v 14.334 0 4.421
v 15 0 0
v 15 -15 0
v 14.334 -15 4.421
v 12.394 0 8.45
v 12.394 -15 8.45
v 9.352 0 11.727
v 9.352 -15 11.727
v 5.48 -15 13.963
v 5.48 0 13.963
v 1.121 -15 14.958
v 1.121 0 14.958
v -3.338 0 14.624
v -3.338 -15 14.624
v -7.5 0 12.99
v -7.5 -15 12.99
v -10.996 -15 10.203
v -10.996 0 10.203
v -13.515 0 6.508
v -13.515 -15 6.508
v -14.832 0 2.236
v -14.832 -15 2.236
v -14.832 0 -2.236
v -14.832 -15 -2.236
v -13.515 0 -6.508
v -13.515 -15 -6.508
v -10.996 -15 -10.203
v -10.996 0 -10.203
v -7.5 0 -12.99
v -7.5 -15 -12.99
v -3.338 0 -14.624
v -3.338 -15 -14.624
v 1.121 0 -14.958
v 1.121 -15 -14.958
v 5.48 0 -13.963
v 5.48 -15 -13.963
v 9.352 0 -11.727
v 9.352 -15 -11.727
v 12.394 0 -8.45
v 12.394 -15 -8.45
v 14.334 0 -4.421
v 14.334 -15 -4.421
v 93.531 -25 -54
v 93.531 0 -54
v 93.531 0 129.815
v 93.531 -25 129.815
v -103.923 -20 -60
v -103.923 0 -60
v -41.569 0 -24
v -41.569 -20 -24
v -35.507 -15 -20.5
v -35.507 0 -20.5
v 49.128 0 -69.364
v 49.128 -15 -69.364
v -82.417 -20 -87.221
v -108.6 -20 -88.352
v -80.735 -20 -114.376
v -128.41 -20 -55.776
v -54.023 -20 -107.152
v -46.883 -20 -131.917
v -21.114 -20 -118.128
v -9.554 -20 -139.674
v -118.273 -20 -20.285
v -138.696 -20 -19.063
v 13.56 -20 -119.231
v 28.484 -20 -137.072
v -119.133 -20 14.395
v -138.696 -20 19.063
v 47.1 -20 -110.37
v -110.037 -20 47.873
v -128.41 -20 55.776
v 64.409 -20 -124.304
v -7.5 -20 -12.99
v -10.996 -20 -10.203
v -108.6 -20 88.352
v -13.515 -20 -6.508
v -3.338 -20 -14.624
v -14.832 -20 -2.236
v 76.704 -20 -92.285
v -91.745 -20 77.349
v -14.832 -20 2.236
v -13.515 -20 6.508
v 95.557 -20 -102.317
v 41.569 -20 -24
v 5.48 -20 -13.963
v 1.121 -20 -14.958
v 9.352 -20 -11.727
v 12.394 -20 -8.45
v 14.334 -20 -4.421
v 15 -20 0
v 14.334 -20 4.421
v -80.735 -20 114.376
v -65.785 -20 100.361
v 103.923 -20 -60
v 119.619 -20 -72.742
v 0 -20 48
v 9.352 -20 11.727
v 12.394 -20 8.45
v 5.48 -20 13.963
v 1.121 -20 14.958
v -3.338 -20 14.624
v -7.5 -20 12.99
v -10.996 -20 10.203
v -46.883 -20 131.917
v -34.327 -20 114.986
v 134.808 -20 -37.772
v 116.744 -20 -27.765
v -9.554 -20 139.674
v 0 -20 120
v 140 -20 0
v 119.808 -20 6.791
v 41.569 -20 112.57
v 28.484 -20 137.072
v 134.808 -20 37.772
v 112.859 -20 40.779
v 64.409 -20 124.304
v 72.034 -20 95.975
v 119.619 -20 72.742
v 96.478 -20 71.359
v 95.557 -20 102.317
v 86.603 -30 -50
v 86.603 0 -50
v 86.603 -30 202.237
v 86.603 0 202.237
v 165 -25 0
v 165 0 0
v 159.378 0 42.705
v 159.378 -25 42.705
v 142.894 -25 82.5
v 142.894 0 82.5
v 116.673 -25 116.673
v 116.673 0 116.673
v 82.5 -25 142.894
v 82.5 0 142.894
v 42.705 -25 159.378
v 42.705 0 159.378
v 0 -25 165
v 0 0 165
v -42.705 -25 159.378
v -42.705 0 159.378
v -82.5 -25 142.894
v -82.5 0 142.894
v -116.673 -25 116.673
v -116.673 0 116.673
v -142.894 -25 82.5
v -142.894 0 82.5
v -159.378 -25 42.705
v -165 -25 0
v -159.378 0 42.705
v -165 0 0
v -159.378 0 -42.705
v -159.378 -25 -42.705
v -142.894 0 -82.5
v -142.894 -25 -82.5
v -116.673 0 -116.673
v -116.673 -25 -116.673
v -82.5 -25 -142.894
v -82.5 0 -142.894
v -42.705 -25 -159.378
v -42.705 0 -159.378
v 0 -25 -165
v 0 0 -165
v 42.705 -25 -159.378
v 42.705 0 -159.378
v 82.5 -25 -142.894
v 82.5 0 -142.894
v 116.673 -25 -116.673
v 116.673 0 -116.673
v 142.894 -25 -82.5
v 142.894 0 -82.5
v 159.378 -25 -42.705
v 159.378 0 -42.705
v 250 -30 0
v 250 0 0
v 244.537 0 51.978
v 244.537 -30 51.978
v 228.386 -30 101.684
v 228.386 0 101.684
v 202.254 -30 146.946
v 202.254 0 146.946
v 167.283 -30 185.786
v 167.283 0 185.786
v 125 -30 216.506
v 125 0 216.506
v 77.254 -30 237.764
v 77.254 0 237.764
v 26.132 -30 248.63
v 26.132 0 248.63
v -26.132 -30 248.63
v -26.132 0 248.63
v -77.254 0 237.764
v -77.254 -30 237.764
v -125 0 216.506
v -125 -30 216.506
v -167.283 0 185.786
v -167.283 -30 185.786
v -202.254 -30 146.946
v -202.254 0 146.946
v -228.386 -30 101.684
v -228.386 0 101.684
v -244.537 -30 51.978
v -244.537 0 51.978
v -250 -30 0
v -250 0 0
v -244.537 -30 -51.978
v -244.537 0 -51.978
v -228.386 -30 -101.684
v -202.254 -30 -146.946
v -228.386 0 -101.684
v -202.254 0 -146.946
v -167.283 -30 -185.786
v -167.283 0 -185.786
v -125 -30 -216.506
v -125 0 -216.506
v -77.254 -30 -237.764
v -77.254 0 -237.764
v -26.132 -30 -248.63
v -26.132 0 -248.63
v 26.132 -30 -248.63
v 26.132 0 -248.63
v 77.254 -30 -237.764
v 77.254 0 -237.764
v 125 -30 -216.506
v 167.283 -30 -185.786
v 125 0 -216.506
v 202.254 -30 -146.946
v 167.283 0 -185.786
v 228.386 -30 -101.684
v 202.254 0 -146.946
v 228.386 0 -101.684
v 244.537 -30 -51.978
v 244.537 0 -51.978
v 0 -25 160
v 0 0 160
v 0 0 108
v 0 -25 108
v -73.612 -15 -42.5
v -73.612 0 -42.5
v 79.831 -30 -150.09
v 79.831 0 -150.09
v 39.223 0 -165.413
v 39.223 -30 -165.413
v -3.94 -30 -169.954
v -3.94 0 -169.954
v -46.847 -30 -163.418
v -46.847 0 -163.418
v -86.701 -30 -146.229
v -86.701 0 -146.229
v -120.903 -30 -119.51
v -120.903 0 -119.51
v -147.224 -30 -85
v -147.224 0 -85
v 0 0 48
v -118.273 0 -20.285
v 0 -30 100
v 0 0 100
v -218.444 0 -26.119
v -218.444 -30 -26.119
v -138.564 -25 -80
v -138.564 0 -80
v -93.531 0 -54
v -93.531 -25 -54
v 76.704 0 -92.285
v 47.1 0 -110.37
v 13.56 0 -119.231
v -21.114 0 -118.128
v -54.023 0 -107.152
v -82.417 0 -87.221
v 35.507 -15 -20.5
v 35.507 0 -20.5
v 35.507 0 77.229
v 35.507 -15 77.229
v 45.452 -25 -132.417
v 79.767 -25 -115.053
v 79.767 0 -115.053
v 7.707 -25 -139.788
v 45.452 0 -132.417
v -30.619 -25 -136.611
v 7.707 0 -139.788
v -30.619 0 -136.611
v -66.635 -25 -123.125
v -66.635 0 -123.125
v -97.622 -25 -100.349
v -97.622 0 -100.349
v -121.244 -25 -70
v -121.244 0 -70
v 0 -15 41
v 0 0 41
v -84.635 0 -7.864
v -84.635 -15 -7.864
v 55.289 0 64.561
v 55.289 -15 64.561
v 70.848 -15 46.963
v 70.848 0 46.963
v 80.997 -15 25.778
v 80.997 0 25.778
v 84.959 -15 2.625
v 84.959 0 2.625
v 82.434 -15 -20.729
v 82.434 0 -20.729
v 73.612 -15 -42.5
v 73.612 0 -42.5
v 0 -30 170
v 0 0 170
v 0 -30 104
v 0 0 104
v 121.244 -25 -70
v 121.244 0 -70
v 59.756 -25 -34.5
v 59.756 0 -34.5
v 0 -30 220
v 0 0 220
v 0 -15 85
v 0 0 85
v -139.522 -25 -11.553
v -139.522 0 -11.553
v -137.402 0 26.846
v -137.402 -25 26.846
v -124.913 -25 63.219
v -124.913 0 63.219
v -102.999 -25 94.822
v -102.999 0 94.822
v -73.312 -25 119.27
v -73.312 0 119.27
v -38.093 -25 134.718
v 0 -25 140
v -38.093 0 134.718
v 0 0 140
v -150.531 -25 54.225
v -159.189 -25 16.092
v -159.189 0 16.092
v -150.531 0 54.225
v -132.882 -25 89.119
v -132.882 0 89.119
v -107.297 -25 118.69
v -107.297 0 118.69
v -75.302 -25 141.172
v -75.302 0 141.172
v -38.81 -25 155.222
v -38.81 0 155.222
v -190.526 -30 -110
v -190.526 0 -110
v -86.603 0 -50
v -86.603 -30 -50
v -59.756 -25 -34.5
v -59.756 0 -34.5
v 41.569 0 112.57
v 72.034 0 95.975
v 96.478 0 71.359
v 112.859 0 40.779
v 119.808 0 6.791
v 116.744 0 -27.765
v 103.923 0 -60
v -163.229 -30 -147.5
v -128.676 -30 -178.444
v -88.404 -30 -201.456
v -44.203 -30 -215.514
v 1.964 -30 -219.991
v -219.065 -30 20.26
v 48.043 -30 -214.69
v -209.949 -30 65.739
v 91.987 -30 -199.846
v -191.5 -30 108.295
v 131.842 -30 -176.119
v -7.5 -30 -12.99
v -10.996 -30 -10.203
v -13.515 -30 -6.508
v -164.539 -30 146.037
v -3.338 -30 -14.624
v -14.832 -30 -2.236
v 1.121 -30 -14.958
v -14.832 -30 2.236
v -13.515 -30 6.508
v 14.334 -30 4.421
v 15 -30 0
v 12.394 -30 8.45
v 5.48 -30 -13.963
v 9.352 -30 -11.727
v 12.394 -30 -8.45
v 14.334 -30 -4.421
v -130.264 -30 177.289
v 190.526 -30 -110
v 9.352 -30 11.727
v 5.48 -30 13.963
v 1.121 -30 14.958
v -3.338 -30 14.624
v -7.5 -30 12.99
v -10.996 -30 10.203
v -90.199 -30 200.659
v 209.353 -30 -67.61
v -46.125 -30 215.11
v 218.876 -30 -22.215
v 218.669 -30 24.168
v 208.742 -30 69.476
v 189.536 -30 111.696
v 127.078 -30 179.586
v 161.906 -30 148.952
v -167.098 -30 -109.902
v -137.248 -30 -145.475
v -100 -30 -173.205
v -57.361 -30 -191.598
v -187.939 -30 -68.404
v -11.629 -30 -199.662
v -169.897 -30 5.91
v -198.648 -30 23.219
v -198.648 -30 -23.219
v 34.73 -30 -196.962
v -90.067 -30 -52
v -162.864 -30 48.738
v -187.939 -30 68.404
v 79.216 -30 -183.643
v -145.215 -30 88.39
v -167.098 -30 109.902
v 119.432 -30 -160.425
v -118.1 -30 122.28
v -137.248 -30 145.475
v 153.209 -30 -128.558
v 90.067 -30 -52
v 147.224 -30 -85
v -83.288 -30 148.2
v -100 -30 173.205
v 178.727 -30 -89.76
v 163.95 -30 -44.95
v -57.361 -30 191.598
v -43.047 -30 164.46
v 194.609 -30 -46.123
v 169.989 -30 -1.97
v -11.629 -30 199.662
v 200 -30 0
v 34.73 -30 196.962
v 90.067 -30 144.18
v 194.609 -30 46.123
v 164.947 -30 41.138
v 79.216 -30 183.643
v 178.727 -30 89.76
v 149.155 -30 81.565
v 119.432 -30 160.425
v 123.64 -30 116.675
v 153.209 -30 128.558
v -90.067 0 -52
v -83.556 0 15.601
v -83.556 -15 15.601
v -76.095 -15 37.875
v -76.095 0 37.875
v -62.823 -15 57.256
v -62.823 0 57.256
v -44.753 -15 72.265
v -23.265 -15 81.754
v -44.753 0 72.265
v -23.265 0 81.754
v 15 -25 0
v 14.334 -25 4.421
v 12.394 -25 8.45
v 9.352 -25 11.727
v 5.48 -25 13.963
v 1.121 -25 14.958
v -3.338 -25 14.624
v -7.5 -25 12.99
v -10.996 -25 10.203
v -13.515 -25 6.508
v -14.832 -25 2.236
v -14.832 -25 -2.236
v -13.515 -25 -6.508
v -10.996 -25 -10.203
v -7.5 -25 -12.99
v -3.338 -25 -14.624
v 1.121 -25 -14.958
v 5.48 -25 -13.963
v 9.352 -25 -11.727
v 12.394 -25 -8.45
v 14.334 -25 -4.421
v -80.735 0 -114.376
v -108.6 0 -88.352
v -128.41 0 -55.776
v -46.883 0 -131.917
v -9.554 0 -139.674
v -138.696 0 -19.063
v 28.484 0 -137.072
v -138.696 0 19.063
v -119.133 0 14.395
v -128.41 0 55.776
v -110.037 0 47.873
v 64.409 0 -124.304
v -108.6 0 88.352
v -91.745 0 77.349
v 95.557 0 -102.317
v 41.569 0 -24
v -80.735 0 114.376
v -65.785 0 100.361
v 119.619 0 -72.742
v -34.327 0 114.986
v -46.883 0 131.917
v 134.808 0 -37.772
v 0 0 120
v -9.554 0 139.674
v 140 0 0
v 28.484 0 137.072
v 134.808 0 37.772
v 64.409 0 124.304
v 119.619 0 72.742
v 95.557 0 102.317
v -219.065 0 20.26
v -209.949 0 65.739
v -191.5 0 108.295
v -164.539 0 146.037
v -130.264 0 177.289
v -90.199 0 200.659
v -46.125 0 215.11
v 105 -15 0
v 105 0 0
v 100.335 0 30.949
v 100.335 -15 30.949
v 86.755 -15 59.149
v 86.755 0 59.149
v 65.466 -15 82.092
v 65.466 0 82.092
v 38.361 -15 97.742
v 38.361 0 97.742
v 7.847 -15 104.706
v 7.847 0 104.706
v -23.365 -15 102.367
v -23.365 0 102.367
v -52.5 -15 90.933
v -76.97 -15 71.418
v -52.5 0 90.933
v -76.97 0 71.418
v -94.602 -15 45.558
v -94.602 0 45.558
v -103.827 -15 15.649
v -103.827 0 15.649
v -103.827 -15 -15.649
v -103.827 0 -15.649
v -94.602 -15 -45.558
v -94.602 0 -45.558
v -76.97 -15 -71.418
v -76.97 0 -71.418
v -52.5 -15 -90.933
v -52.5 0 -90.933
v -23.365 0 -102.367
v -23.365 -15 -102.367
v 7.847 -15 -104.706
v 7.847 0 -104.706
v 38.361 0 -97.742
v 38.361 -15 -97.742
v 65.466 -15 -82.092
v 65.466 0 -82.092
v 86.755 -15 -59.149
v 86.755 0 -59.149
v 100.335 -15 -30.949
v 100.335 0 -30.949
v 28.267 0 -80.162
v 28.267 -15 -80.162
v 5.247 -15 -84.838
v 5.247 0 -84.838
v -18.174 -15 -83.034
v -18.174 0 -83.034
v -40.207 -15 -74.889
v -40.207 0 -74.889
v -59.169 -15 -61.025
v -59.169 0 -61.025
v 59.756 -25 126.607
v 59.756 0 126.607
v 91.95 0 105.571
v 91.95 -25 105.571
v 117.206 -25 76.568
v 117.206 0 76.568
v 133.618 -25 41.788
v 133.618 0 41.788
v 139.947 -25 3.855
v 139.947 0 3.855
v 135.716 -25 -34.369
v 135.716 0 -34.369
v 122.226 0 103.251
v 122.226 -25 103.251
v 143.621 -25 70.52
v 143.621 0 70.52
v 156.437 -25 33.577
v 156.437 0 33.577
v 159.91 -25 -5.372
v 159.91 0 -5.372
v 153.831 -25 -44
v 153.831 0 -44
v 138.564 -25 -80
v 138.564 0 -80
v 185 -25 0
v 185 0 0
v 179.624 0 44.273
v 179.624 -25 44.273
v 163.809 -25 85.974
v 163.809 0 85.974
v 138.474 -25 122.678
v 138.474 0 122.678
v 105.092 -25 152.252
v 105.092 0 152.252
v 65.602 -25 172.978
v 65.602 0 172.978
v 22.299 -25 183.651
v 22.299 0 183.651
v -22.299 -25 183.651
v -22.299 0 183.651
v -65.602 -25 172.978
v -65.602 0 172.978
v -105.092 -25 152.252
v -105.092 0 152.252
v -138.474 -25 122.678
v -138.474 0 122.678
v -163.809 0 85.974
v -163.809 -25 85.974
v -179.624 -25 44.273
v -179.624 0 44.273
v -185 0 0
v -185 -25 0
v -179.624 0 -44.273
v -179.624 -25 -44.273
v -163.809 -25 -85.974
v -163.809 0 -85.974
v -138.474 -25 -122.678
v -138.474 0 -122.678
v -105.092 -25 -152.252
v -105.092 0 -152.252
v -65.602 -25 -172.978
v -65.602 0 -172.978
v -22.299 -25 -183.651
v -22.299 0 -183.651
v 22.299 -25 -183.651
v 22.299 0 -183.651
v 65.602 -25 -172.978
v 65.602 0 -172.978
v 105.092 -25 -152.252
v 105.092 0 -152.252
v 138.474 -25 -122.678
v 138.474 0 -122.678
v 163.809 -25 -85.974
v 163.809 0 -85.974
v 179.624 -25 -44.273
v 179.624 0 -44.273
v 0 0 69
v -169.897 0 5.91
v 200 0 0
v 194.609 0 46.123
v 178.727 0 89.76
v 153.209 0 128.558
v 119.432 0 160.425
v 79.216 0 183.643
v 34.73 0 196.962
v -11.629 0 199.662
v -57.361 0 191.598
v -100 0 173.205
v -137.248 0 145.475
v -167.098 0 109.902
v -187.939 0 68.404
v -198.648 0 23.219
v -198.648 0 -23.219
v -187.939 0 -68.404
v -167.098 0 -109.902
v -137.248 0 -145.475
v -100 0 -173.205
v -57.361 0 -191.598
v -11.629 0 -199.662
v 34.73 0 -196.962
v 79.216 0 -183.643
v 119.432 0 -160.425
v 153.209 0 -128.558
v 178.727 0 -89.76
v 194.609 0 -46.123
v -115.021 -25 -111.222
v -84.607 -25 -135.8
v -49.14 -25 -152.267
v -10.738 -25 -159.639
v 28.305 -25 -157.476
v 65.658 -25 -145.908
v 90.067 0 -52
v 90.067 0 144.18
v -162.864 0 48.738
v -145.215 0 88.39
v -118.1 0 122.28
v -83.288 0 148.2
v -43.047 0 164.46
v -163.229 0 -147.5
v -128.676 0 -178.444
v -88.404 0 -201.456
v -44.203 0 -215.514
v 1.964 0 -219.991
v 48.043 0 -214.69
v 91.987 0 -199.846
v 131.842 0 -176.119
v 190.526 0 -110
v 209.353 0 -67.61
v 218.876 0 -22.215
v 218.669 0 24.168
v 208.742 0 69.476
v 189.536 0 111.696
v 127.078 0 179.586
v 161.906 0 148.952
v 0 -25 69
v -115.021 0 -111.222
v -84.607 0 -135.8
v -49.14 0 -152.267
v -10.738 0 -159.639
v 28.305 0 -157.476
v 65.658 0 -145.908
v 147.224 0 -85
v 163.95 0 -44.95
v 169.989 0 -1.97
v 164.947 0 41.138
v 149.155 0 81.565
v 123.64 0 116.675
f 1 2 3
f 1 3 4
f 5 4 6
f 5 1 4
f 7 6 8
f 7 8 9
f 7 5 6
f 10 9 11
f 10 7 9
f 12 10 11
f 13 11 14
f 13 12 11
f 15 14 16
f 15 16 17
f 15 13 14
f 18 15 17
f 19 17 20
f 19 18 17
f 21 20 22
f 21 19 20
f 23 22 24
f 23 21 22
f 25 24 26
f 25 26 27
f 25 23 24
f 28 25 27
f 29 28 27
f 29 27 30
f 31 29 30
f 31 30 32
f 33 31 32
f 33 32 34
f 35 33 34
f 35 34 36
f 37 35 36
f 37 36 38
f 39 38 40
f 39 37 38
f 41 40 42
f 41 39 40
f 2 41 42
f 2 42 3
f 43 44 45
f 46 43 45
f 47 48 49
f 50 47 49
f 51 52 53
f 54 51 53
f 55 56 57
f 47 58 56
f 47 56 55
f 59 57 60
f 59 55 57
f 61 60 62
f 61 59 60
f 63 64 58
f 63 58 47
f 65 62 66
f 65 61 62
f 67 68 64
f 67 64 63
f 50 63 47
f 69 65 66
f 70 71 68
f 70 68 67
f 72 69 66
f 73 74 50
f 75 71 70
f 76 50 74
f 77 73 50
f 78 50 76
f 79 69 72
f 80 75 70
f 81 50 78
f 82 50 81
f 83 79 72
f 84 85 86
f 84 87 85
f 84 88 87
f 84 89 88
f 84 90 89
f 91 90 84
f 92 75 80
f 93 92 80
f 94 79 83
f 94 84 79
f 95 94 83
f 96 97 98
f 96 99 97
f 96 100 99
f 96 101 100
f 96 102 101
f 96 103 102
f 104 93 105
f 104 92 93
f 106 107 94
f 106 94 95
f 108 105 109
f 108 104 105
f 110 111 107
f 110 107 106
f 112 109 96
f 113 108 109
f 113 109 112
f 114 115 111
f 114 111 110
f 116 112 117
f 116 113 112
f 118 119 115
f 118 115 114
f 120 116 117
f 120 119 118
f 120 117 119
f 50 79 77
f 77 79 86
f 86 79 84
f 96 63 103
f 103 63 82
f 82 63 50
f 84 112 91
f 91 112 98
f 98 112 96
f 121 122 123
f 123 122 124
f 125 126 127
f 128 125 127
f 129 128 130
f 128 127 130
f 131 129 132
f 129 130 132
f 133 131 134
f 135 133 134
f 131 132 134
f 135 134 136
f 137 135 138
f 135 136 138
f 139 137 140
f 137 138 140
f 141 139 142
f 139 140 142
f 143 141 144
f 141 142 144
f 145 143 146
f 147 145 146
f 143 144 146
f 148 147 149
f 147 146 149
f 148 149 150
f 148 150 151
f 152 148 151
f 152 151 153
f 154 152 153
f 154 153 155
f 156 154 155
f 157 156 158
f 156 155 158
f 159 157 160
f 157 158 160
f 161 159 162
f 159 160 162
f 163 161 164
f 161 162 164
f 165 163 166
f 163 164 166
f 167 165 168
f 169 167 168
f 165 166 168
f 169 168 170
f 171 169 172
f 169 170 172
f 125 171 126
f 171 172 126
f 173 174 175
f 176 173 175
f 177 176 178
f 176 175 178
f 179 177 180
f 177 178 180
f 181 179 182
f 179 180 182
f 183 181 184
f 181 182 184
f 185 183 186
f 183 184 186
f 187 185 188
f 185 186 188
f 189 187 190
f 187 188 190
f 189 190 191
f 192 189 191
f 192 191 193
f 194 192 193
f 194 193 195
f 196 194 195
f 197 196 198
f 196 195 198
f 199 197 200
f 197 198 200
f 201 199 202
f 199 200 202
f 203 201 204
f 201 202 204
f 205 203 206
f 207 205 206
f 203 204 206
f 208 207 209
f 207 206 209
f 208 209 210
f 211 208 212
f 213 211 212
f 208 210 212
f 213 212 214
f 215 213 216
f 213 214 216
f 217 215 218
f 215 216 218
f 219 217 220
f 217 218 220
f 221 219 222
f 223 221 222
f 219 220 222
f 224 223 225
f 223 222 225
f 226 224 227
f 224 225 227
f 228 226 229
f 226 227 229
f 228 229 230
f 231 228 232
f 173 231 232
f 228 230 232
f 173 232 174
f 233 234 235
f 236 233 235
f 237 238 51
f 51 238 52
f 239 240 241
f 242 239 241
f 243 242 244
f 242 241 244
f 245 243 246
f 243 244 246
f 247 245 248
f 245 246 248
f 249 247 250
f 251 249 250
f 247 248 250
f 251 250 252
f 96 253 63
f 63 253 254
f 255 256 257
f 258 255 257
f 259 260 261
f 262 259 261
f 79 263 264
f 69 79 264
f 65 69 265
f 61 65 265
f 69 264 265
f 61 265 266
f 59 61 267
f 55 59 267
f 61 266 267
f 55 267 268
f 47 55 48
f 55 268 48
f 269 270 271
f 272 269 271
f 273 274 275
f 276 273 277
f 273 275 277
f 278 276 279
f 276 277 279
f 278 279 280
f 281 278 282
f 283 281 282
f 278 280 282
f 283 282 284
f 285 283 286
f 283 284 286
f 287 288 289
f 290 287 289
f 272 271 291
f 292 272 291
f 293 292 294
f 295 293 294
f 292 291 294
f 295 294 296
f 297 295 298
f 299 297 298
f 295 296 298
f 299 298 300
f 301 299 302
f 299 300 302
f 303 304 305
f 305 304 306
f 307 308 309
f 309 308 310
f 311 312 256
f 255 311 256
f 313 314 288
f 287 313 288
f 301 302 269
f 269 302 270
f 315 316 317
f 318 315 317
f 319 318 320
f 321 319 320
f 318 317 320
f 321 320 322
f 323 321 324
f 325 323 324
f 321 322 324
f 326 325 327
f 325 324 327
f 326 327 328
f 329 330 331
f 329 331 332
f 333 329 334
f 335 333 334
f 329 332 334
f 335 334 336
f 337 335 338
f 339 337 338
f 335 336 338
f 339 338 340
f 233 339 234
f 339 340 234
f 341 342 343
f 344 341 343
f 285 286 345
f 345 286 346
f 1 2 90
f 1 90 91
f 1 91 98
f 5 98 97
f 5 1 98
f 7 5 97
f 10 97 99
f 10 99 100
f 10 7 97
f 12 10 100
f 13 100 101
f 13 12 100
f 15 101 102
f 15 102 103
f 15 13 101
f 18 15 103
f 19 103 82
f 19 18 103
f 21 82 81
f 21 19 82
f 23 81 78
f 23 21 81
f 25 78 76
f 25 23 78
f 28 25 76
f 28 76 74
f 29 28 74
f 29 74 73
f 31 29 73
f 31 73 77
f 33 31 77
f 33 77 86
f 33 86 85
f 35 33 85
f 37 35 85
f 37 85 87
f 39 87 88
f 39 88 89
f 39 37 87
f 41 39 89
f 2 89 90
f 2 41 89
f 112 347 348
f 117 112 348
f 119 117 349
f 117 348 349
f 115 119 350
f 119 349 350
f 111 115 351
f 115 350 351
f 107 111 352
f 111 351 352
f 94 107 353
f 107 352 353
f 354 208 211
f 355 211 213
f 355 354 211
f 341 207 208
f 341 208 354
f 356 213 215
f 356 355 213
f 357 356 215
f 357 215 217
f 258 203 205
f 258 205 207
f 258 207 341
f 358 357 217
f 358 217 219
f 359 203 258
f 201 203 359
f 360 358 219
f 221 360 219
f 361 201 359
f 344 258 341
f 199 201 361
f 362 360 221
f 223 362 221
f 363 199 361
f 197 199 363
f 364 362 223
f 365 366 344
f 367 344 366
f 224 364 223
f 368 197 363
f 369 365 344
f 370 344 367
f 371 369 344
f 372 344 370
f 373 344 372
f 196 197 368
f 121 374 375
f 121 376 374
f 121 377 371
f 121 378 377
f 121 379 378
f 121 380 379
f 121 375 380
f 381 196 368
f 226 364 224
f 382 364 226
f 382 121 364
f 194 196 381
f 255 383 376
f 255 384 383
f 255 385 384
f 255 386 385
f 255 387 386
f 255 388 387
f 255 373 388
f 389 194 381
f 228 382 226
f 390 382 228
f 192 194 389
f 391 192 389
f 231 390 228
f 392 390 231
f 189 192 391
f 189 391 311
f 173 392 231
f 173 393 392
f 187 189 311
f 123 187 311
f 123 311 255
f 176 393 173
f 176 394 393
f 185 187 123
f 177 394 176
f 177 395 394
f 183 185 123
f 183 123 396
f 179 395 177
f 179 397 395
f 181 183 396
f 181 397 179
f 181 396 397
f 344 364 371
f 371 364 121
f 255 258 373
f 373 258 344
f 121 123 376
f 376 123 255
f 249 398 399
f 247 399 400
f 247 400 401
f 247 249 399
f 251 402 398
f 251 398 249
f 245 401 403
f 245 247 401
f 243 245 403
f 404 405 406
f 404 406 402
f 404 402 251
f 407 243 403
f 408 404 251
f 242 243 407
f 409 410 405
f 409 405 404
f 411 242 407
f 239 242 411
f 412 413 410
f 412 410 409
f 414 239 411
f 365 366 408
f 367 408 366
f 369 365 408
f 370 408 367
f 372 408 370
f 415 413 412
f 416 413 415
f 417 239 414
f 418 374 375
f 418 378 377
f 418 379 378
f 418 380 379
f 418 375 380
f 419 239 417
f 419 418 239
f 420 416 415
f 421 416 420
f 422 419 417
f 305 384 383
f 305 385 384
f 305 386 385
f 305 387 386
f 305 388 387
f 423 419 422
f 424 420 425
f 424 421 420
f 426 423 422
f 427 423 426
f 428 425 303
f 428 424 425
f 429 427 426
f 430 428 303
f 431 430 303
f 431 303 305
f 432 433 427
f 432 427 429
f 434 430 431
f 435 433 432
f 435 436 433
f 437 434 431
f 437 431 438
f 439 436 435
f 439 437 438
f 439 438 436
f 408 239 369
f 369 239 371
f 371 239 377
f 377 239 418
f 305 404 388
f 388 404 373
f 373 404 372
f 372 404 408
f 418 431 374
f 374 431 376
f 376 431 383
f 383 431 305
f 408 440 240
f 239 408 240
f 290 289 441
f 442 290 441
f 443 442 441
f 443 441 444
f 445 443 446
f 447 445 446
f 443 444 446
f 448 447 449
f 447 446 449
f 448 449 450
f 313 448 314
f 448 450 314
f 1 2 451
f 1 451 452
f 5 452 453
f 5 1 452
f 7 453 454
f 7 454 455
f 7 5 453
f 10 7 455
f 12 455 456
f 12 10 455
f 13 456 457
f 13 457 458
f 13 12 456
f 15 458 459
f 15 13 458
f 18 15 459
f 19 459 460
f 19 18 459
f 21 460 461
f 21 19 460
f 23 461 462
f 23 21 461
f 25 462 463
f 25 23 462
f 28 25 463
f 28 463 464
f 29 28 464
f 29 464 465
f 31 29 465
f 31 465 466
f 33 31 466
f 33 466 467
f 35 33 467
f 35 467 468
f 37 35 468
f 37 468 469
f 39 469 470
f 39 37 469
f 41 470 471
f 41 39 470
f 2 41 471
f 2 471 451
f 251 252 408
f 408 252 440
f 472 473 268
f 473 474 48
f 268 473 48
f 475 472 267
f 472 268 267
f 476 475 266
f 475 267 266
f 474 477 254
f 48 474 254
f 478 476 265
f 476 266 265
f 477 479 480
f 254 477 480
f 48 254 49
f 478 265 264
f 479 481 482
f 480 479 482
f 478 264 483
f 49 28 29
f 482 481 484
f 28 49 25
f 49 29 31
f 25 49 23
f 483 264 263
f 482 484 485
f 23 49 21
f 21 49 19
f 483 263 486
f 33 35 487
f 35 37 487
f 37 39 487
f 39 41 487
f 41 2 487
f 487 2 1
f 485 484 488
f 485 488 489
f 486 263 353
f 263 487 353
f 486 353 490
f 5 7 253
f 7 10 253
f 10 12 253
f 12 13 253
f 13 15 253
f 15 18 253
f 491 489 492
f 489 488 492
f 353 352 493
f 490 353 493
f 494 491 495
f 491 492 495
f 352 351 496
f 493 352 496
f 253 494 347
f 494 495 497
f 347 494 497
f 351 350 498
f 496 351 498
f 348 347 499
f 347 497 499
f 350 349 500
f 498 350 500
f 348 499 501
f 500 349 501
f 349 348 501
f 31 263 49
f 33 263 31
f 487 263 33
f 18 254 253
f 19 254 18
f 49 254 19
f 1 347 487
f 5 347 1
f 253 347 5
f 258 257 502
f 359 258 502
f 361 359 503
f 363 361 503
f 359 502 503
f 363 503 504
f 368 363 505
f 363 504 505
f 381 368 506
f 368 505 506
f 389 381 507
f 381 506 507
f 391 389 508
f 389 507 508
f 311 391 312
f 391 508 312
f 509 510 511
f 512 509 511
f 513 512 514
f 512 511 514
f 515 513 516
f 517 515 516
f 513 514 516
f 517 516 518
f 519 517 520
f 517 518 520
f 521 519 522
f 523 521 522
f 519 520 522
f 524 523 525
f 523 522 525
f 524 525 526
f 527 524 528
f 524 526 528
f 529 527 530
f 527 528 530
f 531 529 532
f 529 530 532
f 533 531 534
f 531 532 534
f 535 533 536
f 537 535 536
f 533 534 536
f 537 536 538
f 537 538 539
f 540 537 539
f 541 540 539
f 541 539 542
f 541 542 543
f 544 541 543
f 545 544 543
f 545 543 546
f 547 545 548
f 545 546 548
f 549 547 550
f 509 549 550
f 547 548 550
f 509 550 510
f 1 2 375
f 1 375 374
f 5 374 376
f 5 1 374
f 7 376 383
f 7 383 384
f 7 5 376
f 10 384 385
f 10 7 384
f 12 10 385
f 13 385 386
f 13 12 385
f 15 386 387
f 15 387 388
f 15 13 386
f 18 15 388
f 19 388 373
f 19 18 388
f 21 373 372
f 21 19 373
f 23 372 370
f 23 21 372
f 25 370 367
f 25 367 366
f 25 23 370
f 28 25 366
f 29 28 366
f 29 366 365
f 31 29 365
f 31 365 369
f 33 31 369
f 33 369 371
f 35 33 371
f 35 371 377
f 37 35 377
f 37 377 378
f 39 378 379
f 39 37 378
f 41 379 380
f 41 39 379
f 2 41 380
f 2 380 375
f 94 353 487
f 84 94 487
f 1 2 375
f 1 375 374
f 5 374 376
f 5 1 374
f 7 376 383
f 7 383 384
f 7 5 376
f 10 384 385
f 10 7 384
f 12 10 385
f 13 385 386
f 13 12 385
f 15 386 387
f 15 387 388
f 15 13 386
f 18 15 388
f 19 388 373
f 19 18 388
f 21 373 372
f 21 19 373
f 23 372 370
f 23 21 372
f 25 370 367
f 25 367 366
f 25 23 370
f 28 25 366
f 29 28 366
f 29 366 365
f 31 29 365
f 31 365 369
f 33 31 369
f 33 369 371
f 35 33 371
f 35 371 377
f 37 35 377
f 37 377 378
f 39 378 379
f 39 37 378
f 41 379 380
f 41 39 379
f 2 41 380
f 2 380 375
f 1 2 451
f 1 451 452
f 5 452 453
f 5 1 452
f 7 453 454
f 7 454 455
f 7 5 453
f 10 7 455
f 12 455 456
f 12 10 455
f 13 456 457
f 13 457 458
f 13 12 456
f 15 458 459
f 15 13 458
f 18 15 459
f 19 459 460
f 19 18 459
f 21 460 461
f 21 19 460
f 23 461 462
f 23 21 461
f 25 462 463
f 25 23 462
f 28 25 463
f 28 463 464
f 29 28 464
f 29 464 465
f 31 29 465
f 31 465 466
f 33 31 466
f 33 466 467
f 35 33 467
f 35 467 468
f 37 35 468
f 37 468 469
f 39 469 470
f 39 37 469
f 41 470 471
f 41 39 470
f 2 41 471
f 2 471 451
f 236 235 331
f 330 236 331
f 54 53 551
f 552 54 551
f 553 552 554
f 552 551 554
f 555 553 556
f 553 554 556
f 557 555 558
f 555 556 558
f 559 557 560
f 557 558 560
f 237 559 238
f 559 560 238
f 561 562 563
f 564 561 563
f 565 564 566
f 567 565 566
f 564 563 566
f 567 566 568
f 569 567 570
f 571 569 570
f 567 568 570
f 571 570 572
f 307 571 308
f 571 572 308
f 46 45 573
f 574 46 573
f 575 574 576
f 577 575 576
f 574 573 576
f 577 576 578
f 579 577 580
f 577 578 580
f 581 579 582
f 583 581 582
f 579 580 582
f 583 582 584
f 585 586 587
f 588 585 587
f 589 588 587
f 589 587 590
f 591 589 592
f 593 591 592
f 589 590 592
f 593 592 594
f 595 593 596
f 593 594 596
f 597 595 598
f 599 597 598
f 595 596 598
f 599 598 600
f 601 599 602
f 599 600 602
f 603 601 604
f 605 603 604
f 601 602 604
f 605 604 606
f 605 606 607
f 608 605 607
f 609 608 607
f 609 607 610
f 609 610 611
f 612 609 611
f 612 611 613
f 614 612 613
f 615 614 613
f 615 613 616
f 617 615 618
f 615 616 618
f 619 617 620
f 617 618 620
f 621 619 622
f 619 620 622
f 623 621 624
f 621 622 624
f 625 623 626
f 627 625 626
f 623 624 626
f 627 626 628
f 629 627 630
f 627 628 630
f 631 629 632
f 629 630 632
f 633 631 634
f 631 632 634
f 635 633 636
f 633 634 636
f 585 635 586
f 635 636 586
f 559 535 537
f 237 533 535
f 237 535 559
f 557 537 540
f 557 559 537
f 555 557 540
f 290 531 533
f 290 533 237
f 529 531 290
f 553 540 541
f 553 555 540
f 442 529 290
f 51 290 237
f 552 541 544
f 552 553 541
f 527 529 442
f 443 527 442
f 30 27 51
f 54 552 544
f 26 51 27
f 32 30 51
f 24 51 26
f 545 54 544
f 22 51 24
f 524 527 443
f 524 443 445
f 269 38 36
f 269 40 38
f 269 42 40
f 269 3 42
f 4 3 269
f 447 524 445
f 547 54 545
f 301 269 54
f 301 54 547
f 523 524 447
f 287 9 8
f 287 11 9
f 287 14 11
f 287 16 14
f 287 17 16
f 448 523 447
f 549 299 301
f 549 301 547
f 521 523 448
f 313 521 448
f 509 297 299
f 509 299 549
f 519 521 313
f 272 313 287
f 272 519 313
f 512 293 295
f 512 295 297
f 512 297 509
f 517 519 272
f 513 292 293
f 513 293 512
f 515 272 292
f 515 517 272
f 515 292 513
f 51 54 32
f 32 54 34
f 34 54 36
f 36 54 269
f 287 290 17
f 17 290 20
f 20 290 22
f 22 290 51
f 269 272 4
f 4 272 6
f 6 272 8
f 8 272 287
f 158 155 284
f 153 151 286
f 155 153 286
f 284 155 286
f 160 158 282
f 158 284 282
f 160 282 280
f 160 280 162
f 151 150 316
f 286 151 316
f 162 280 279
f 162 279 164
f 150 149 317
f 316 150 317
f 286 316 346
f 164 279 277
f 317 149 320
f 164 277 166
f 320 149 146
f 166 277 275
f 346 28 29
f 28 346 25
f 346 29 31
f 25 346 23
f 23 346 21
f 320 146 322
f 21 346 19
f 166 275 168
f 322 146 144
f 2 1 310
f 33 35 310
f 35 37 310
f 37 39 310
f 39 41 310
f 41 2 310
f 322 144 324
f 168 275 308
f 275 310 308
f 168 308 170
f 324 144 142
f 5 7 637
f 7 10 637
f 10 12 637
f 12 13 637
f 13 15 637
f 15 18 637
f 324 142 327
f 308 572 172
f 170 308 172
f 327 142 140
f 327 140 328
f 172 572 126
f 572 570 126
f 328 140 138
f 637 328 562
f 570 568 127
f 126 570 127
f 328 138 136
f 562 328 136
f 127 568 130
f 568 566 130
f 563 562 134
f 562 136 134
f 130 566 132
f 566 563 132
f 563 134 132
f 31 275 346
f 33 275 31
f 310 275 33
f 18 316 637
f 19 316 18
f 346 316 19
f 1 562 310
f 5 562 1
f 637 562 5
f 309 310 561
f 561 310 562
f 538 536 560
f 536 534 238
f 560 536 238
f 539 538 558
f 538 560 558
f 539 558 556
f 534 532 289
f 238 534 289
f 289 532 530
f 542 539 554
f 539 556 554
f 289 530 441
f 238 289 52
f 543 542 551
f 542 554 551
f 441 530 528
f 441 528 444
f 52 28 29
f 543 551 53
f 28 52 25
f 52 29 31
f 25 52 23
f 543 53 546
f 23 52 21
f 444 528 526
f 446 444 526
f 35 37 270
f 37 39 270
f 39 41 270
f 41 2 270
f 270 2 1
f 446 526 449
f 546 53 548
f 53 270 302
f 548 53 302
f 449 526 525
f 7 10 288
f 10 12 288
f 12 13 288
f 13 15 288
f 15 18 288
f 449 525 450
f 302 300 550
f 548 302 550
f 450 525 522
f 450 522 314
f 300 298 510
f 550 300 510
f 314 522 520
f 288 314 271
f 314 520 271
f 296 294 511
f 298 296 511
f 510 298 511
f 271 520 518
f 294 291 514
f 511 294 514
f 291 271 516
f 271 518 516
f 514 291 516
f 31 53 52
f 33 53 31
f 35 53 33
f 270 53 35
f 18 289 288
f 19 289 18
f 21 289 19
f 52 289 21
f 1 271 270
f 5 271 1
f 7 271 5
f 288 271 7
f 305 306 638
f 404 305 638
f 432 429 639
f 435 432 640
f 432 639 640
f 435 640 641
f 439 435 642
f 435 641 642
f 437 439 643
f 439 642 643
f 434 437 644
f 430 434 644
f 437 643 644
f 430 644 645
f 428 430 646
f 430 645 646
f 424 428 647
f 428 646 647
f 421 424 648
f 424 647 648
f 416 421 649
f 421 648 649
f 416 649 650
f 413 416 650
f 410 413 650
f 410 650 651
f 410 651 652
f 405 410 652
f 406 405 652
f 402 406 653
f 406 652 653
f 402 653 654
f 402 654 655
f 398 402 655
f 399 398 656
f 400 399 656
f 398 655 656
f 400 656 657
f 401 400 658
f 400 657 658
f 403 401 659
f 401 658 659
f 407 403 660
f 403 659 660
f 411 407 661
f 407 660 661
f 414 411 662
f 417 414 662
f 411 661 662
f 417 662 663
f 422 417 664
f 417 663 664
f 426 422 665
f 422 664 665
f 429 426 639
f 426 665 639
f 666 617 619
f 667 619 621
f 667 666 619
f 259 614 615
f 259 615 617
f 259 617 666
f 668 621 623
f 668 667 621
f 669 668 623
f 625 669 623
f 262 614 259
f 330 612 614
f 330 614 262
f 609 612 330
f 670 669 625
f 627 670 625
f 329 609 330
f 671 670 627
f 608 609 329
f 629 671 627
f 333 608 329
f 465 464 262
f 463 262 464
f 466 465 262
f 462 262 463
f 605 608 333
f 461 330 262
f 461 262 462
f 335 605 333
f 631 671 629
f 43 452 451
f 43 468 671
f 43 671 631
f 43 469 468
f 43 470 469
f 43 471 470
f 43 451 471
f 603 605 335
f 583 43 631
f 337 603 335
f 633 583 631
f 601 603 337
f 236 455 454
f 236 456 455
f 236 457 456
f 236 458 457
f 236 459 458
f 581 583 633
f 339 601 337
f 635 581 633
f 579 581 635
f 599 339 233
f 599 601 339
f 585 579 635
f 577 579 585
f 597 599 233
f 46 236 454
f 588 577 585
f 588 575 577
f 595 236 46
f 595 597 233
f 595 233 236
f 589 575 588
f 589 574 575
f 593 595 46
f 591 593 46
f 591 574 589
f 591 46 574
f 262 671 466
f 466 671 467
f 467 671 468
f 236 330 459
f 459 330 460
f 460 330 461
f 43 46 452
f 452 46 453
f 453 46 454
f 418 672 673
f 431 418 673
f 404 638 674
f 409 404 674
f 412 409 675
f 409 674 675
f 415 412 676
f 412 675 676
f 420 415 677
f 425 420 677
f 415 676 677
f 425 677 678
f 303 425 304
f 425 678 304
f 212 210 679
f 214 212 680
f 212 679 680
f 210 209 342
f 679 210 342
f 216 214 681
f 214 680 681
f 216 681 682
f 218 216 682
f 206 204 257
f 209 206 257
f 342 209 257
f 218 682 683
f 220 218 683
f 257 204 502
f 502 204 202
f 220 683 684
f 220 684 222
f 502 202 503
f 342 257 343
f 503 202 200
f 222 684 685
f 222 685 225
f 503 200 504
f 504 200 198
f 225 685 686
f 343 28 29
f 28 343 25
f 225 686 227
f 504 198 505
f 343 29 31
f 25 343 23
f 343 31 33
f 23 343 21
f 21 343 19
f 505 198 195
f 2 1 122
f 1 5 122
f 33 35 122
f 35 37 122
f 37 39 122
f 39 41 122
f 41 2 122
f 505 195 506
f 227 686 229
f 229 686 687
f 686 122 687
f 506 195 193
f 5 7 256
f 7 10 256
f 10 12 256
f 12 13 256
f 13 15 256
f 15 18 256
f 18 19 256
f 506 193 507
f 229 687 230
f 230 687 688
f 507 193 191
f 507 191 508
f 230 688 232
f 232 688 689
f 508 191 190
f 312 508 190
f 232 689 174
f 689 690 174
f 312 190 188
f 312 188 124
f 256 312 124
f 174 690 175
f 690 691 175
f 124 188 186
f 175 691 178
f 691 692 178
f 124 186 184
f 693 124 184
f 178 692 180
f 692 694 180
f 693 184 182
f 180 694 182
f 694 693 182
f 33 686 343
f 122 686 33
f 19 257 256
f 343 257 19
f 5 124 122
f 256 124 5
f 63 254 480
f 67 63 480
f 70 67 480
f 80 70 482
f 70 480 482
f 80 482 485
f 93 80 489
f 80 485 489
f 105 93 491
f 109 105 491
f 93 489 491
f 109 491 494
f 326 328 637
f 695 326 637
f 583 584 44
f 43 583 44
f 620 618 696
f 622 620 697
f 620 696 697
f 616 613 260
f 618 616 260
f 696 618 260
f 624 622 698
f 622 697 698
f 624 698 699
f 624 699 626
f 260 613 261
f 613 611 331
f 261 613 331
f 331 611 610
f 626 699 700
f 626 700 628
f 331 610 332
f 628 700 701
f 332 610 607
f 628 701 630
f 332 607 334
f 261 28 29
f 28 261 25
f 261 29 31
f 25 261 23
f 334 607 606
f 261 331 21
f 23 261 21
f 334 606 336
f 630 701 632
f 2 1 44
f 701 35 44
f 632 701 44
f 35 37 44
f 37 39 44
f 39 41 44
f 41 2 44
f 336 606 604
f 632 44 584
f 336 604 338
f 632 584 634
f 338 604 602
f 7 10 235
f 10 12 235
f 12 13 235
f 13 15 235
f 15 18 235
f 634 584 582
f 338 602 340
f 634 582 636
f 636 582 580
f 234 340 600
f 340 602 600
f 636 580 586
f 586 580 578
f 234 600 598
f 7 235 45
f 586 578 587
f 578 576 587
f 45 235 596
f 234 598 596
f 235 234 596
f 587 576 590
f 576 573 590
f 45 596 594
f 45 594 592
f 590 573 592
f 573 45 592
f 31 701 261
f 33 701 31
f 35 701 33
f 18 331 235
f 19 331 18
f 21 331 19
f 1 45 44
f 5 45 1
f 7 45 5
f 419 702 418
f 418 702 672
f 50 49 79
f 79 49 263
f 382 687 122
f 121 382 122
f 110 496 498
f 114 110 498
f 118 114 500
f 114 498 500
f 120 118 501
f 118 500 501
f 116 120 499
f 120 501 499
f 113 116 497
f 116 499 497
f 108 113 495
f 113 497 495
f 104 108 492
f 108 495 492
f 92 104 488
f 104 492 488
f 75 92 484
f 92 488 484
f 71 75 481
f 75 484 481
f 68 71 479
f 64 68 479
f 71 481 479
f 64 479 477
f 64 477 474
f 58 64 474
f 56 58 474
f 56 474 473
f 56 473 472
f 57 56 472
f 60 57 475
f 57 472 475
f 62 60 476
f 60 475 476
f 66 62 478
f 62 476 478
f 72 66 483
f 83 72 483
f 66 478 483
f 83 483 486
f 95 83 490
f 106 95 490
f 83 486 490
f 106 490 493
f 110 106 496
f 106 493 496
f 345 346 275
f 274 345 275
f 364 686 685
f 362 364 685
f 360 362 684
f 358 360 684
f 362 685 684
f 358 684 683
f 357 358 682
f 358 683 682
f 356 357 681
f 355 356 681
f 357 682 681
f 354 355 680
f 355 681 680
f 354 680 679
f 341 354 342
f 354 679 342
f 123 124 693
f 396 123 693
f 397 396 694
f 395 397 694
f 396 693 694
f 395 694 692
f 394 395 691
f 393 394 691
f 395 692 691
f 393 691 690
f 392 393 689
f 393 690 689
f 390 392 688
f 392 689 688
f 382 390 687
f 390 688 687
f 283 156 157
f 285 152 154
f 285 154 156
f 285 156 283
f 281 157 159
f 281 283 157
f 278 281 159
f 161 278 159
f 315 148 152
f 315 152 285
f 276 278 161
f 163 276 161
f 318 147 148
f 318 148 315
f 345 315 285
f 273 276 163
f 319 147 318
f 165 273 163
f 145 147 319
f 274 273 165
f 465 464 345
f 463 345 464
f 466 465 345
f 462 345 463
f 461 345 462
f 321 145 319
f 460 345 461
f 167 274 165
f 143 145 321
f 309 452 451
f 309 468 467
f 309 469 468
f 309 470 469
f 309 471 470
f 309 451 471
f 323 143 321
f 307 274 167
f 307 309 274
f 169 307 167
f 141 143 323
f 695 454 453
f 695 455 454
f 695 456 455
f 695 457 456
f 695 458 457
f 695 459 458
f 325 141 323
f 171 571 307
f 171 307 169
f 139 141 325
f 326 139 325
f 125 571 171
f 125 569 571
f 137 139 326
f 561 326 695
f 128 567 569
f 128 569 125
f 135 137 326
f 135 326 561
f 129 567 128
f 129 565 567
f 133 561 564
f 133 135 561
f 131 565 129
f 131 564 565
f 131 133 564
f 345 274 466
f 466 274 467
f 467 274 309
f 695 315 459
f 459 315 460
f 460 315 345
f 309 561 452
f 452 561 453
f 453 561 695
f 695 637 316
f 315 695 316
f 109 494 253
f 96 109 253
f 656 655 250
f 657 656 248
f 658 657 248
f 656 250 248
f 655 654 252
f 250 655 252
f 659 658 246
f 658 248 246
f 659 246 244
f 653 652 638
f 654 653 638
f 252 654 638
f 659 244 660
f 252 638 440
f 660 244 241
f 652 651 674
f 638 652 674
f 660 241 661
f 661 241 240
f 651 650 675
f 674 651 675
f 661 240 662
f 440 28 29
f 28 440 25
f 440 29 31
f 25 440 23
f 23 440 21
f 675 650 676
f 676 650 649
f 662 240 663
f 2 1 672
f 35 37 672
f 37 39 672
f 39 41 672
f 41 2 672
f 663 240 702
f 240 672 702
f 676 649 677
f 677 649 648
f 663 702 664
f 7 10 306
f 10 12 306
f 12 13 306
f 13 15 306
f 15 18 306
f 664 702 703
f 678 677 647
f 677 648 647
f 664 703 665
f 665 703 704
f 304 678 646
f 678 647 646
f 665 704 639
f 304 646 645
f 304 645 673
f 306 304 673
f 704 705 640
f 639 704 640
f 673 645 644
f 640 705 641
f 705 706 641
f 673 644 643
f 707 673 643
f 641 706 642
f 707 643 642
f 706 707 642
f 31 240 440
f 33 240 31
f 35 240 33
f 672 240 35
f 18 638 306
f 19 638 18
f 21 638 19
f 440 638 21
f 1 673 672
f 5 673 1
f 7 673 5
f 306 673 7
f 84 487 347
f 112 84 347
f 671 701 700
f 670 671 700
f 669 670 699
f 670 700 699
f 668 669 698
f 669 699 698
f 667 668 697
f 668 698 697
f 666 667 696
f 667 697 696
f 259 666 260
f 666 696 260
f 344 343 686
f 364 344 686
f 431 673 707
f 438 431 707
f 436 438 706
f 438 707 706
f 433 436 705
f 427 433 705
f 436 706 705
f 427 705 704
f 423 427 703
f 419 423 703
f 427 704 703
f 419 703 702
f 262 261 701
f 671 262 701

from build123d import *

# Parameters (mm, degrees)
F0_R      = 250
F0_R_2    = 15
F1_DEPTH  = 30
F2_R      = 200
F2_R_2    = 15
F3_DEPTH  = 30
F4_R      = 185
F4_R_2    = 15
F5_DEPTH  = 25
F6_R      = 165
F6_R_2    = 15
F7_DEPTH  = 25
F8_R      = 140
F8_R_2    = 15
F9_DEPTH  = 20
F10_R     = 105
F10_R_2   = 15
F11_DEPTH = 15


with BuildPart() as f1:
    # F0 (on Front) → F1 (new body)
    with BuildSketch(Plane.XZ):
        Circle(F0_R)
        with BuildLine():
            Line((-190.525589, -110), (-86.60254, -50))
            Line((-86.60254, -50), (131.841529, -176.118742))
            ThreePointArc((131.841529, -176.118742), (-44.202678, -215.513627), (-190.525589, -110))
        make_face(mode=Mode.SUBTRACT)
        with BuildLine():
            ThreePointArc((-218.444069, -26.118742), (-164.538937, 146.037455), (0, 220))
            Line((0, 220), (0, 100))
            Line((0, 100), (-218.444069, -26.118742))
        make_face(mode=Mode.SUBTRACT)
        Circle(F0_R_2, mode=Mode.SUBTRACT)
        with BuildLine():
            Line((190.525589, -110), (86.60254, -50))
            Line((86.60254, -50), (86.60254, 202.237484))
            ThreePointArc((86.60254, 202.237484), (208.741615, 69.476171), (190.525589, -110))
        make_face(mode=Mode.SUBTRACT)
    extrude(amount=F1_DEPTH)


with BuildPart() as f3:
    # F2 (on Front) → F3 (new body)
    with BuildSketch(Plane.XZ):
        Circle(F2_R)
        with BuildLine():
            ThreePointArc((79.830605, -150.090221), (-46.847224, -163.417678), (-147.224319, -85))
            Line((-147.224319, -85), (-90.066642, -52))
            Line((-90.066642, -52), (79.830605, -150.090221))
        make_face(mode=Mode.SUBTRACT)
        with BuildLine():
            ThreePointArc((-169.897247, 5.909779), (-118.100249, 122.279725), (0, 170))
            Line((0, 170), (0, 104))
            Line((0, 104), (-169.897247, 5.909779))
        make_face(mode=Mode.SUBTRACT)
        Circle(F2_R_2, mode=Mode.SUBTRACT)
        with BuildLine():
            ThreePointArc((90.066642, 144.180443), (164.947473, 41.137953), (147.224319, -85))
            Line((147.224319, -85), (90.066642, -52))
            Line((90.066642, -52), (90.066642, 144.180443))
        make_face(mode=Mode.SUBTRACT)
    extrude(amount=F3_DEPTH)


with BuildPart() as f5:
    # F4 (on Front) → F5 (new body)
    with BuildSketch(Plane.XZ):
        Circle(F4_R)
        with BuildLine():
            ThreePointArc((65.657935, -145.907627), (-49.140408, -152.266938), (-138.564065, -80))
            Line((-138.564065, -80), (-93.530744, -54))
            Line((-93.530744, -54), (65.657935, -145.907627))
        make_face(mode=Mode.SUBTRACT)
        with BuildLine():
            ThreePointArc((-159.188679, 16.092373), (-107.296832, 118.690311), (0, 160))
            Line((0, 160), (0, 108))
            Line((0, 108), (-159.188679, 16.092373))
        make_face(mode=Mode.SUBTRACT)
        Circle(F4_R_2, mode=Mode.SUBTRACT)
        with BuildLine():
            ThreePointArc((93.530744, 129.815253), (156.43724, 33.576627), (138.564065, -80))
            Line((138.564065, -80), (93.530744, -54))
            Line((93.530744, -54), (93.530744, 129.815253))
        make_face(mode=Mode.SUBTRACT)
    extrude(amount=F5_DEPTH)


with BuildPart() as f7:
    # F6 (on Front) → F7 (new body)
    with BuildSketch(Plane.XZ):
        Circle(F6_R)
        with BuildLine():
            ThreePointArc((79.76672, -115.053337), (-30.619157, -136.610641), (-121.243557, -70))
            Line((-121.243557, -70), (-59.755753, -34.5))
            Line((-59.755753, -34.5), (79.76672, -115.053337))
        make_face(mode=Mode.SUBTRACT)
        with BuildLine():
            ThreePointArc((-139.522473, -11.553337), (-102.998707, 94.822288), (0, 140))
            Line((0, 140), (0, 69))
            Line((0, 69), (-139.522473, -11.553337))
        make_face(mode=Mode.SUBTRACT)
        Circle(F6_R_2, mode=Mode.SUBTRACT)
        with BuildLine():
            ThreePointArc((59.755753, 126.606674), (133.617864, 41.788352), (121.243557, -70))
            Line((121.243557, -70), (59.755753, -34.5))
            Line((59.755753, -34.5), (59.755753, 126.606674))
        make_face(mode=Mode.SUBTRACT)
    extrude(amount=F7_DEPTH)


with BuildPart() as f9:
    # F8 (on Front) → F9 (new body)
    with BuildSketch(Plane.XZ):
        Circle(F8_R)
        with BuildLine():
            ThreePointArc((76.703851, -92.284989), (-21.114007, -118.127891), (-103.923048, -60))
            Line((-103.923048, -60), (-41.569219, -24))
            Line((-41.569219, -24), (76.703851, -92.284989))
        make_face(mode=Mode.SUBTRACT)
        with BuildLine():
            ThreePointArc((-118.273071, -20.284989), (-91.744751, 77.349212), (0, 120))
            Line((0, 120), (0, 48))
            Line((0, 48), (-118.273071, -20.284989))
        make_face(mode=Mode.SUBTRACT)
        Circle(F8_R_2, mode=Mode.SUBTRACT)
        with BuildLine():
            ThreePointArc((41.569219, 112.569978), (112.858758, 40.778679), (103.923048, -60))
            Line((103.923048, -60), (41.569219, -24))
            Line((41.569219, -24), (41.569219, 112.569978))
        make_face(mode=Mode.SUBTRACT)
    extrude(amount=F9_DEPTH)


with BuildPart() as f11:
    # F10 (on Front) → F11 (new body)
    with BuildSketch(Plane.XZ):
        Circle(F10_R)
        with BuildLine():
            ThreePointArc((49.128371, -69.364278), (-18.173781, -83.034413), (-73.612159, -42.5))
            Line((-73.612159, -42.5), (-35.507042, -20.5))
            Line((-35.507042, -20.5), (49.128371, -69.364278))
        make_face(mode=Mode.SUBTRACT)
        with BuildLine():
            ThreePointArc((-84.635413, -7.864278), (-62.82302, 57.256163), (0, 85))
            Line((0, 85), (0, 41))
            Line((0, 41), (-84.635413, -7.864278))
        make_face(mode=Mode.SUBTRACT)
        Circle(F10_R_2, mode=Mode.SUBTRACT)
        with BuildLine():
            ThreePointArc((35.507042, 77.228557), (80.996801, 25.77825), (73.612159, -42.5))
            Line((73.612159, -42.5), (35.507042, -20.5))
            Line((35.507042, -20.5), (35.507042, 77.228557))
        make_face(mode=Mode.SUBTRACT)
    extrude(amount=F11_DEPTH)


solid = Compound([f1.part, f3.part, f5.part, f7.part, f9.part, f11.part])
